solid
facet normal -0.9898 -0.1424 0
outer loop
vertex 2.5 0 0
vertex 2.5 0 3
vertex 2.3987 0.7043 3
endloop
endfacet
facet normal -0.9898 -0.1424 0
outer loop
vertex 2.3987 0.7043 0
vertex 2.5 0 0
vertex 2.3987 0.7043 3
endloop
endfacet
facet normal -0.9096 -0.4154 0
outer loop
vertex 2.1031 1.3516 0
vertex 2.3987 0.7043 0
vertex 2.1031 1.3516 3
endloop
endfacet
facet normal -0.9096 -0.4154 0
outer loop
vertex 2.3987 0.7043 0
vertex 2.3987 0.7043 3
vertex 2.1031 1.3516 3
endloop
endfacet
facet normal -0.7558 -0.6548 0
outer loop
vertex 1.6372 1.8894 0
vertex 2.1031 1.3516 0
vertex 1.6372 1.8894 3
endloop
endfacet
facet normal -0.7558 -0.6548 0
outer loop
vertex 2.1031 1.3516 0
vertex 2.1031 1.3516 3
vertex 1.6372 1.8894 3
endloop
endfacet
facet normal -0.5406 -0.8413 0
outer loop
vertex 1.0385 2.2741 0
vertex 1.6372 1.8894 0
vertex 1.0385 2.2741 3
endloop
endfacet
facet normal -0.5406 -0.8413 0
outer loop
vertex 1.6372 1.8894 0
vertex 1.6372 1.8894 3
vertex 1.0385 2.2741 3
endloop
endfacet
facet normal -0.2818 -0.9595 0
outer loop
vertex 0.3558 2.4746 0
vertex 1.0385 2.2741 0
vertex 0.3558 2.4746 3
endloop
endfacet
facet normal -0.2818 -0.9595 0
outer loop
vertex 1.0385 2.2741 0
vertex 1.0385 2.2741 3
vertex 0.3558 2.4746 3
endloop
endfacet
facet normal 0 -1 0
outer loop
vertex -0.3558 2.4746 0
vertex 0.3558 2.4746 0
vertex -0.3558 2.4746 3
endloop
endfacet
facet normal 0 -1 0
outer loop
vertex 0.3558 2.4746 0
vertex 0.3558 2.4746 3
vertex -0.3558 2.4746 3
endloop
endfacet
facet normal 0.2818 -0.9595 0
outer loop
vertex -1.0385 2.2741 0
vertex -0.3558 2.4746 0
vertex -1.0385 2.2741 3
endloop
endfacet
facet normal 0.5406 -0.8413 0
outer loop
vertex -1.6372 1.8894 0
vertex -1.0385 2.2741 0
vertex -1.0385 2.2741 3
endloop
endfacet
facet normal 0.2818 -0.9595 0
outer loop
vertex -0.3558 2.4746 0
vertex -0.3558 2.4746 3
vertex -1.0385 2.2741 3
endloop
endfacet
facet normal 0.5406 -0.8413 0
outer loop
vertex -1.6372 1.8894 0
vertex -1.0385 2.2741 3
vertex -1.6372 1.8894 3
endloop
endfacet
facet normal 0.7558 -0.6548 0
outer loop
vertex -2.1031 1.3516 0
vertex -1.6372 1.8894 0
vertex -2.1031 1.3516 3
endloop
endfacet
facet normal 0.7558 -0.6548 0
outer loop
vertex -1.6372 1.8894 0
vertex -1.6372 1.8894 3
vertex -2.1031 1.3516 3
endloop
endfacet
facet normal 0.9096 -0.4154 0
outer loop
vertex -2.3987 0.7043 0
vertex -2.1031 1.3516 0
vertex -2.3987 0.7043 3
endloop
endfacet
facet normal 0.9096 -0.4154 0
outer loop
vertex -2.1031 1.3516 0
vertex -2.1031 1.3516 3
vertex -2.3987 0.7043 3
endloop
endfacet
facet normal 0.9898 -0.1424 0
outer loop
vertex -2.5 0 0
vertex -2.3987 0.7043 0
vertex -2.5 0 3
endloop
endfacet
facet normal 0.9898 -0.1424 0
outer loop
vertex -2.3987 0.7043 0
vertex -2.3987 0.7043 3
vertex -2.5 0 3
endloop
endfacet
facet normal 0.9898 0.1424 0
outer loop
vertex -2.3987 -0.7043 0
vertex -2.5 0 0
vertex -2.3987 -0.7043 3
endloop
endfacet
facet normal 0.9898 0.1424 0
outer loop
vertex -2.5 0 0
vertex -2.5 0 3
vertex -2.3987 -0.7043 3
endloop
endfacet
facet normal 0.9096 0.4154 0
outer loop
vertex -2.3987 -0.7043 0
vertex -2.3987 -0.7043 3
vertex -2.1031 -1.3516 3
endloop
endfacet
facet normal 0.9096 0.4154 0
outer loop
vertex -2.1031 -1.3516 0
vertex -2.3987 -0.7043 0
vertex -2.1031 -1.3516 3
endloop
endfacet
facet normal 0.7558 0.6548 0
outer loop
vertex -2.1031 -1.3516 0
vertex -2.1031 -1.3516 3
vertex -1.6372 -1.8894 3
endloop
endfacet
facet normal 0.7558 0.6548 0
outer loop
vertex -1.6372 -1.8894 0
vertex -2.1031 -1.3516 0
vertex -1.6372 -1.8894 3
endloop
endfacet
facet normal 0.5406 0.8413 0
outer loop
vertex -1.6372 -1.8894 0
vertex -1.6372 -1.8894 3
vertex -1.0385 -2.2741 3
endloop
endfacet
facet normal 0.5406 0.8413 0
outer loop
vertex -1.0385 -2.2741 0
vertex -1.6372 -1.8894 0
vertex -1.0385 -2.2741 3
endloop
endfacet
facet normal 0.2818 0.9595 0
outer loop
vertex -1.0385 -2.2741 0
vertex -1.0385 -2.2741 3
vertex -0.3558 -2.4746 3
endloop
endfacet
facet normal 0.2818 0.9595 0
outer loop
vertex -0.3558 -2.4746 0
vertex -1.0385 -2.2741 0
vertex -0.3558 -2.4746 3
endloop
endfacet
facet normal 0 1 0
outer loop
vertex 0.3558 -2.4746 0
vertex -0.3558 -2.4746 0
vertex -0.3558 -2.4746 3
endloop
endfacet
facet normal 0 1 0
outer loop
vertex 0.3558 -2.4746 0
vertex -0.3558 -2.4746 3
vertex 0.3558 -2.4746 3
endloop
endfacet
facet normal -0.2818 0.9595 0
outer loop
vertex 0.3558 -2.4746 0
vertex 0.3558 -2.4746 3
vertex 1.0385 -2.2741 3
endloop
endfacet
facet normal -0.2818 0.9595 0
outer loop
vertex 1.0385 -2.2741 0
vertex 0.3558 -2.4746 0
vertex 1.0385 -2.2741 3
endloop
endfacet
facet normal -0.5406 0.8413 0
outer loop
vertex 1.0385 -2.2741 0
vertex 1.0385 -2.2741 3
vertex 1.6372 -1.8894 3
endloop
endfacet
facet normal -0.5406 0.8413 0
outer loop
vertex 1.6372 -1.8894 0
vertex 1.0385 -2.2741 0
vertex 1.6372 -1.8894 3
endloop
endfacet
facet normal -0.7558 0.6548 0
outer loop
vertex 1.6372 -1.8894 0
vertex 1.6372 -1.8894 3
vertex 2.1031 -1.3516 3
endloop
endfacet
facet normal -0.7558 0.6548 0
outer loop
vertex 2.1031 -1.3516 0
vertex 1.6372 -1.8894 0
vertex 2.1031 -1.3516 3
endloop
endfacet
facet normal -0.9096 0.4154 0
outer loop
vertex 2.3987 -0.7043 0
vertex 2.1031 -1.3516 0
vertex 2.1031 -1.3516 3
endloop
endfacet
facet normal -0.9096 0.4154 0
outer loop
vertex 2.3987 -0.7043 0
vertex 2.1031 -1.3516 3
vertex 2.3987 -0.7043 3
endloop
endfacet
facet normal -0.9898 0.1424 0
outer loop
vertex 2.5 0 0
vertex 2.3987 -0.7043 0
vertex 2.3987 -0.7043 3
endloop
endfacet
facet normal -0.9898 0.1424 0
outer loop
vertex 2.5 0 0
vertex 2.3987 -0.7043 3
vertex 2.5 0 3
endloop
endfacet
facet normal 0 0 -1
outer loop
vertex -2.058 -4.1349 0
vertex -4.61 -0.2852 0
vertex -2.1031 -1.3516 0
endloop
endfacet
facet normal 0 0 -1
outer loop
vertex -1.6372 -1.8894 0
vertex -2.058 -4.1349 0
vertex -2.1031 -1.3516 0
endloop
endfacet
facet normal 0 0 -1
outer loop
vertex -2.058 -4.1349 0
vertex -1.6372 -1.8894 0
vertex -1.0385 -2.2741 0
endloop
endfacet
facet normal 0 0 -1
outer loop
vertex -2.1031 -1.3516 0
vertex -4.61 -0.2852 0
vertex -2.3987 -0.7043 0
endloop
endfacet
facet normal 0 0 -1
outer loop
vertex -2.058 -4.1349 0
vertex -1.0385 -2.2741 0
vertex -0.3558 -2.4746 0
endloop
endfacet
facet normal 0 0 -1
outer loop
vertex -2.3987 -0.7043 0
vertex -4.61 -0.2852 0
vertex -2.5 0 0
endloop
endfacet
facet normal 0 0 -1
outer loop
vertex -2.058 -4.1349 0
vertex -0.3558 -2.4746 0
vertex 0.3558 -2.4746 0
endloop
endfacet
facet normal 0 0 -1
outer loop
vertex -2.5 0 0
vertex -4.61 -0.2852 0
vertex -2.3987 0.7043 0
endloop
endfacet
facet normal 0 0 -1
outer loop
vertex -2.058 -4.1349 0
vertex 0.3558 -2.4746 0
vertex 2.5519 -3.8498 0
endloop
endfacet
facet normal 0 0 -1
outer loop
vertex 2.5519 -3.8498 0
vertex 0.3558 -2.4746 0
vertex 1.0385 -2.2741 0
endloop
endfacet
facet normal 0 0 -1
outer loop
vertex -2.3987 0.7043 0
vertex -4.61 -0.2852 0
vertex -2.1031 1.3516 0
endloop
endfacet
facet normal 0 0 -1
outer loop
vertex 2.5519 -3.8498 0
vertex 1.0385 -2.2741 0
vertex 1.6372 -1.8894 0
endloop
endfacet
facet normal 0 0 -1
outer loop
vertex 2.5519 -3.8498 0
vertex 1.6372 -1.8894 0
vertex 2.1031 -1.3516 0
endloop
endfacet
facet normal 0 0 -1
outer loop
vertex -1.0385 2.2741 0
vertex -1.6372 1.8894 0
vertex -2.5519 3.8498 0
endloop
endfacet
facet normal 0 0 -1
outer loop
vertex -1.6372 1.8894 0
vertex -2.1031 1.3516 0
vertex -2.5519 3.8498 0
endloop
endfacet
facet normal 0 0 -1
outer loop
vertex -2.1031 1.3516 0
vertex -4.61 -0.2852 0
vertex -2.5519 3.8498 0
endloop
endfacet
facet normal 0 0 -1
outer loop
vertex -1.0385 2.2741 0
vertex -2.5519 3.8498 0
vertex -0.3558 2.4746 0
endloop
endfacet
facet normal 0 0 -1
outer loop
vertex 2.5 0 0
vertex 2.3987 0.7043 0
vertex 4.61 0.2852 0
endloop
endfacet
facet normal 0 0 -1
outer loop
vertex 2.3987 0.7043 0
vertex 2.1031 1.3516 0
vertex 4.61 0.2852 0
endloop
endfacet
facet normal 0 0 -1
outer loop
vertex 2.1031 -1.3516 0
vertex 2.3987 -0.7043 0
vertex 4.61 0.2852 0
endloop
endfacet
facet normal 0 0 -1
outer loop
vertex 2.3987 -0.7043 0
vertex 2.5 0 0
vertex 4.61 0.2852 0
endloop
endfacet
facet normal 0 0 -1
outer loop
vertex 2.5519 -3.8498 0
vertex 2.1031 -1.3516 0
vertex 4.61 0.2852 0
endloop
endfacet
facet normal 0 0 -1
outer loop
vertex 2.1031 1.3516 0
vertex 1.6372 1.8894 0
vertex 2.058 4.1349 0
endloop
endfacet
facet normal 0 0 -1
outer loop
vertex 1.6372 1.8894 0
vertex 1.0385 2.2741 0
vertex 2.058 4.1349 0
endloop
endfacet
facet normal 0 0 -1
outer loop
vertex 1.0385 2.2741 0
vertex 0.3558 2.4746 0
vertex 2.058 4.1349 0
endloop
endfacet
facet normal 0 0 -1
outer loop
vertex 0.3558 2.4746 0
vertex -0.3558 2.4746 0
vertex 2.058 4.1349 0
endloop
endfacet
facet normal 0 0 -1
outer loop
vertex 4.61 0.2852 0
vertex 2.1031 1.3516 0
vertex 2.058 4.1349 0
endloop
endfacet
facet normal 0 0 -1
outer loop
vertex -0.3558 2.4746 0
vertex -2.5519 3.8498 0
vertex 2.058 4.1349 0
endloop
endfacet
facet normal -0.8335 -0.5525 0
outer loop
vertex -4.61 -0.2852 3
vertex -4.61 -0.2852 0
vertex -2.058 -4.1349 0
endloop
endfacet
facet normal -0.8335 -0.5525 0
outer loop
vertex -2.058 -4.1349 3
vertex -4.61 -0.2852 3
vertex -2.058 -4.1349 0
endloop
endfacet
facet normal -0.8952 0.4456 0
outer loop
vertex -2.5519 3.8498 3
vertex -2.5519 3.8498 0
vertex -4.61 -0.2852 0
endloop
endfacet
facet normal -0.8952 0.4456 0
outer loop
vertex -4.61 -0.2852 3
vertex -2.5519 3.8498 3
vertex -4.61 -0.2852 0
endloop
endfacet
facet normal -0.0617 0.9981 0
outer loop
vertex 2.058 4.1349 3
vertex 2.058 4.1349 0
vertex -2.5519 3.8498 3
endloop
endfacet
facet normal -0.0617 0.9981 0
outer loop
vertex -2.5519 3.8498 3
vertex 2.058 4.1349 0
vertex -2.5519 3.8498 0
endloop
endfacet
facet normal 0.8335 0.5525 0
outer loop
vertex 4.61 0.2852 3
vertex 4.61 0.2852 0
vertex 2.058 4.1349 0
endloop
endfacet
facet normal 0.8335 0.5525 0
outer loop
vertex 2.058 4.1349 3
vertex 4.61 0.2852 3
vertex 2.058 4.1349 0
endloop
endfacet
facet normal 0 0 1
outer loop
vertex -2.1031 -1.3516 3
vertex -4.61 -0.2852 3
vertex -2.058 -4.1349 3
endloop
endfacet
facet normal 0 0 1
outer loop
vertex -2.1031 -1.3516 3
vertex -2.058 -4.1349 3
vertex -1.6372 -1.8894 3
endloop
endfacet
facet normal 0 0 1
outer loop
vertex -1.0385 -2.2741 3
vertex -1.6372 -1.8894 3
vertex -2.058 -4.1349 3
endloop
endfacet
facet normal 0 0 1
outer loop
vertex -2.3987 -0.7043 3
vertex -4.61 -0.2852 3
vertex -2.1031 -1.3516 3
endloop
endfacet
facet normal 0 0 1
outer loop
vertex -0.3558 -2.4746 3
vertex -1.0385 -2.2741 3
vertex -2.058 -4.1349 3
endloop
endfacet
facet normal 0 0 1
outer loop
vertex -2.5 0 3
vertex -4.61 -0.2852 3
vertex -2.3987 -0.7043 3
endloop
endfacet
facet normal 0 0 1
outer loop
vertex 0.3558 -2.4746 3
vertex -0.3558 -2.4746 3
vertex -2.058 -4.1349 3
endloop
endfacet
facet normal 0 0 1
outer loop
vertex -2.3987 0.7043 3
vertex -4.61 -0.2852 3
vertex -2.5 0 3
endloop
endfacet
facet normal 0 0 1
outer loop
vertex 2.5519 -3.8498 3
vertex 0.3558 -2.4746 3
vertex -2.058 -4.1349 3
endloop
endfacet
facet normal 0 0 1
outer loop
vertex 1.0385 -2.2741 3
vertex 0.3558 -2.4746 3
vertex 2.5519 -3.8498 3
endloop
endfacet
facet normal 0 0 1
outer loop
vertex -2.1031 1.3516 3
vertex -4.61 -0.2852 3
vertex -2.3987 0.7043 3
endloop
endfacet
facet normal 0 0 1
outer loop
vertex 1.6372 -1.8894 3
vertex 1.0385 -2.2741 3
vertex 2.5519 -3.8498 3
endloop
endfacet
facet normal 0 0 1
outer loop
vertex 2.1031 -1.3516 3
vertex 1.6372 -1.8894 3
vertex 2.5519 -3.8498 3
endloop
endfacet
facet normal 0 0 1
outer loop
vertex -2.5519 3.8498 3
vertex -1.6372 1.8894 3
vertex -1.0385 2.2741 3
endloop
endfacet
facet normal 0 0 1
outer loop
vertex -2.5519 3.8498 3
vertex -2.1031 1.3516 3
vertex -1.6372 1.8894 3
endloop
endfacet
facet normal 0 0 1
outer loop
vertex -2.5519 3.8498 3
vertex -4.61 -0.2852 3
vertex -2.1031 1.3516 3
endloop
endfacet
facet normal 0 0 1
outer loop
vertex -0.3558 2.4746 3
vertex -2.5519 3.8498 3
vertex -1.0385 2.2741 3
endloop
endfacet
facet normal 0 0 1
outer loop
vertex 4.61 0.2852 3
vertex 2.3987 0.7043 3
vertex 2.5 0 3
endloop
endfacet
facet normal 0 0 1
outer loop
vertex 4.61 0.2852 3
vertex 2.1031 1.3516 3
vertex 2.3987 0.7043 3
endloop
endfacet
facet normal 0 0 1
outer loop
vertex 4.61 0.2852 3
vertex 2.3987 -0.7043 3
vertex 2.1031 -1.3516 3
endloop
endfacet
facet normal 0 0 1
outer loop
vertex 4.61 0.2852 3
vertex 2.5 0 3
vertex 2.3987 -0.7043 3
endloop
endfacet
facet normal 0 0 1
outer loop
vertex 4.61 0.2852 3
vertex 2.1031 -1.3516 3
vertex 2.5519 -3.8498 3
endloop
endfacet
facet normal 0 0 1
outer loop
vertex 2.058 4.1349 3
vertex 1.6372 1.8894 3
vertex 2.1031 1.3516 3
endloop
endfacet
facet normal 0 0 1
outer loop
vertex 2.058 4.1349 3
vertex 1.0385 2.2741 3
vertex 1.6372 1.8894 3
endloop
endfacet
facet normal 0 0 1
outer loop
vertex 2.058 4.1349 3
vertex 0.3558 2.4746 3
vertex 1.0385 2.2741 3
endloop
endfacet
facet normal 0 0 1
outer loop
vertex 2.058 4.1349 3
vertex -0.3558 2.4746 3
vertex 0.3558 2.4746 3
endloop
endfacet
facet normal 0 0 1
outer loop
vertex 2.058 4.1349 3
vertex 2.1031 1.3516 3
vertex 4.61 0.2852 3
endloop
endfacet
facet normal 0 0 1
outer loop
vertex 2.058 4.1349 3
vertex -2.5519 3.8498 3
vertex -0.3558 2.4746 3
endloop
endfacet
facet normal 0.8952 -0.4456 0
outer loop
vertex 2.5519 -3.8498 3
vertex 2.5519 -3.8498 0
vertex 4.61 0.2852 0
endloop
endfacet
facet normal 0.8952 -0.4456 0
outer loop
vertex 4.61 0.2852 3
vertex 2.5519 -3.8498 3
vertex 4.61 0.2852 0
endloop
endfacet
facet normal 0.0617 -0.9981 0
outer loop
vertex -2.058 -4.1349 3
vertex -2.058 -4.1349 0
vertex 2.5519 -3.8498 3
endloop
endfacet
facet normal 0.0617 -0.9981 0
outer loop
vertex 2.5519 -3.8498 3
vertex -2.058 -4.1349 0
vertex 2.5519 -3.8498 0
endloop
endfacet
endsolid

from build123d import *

# Parameters (mm, degrees)
EXTRUDE_1_DEPTH     = 3
CUT_EXTRUDE_1_REACH = 5
SKETCH_2_R          = 2.5


with BuildPart() as part:
    # 草圖1 → 填料-伸長1 (new body)
    with BuildSketch(Plane.XY):
        Polygon((2.058046104, 4.134946138), (-2.551945347, 3.849793278), (-4.609991451, -0.285152861), (-2.058046104, -4.134946138), (2.551945347, -3.849793278), (4.609991451, 0.285152861), align=None)
    extrude(amount=EXTRUDE_1_DEPTH)

    # 草圖2 → 除料-伸長1 (cut, up to next)
    with BuildSketch(Plane.XY.offset(3), mode=Mode.PRIVATE) as cut_extrude_1_sk1:
        Circle(SKETCH_2_R)
    cut_extrude_1_tool1 = extrude(cut_extrude_1_sk1.sketch, amount=-CUT_EXTRUDE_1_REACH, mode=Mode.PRIVATE) & part.part
    add(cut_extrude_1_tool1.solids().sort_by_distance((0, 0, 3))[0], mode=Mode.SUBTRACT)


solid = part.part
